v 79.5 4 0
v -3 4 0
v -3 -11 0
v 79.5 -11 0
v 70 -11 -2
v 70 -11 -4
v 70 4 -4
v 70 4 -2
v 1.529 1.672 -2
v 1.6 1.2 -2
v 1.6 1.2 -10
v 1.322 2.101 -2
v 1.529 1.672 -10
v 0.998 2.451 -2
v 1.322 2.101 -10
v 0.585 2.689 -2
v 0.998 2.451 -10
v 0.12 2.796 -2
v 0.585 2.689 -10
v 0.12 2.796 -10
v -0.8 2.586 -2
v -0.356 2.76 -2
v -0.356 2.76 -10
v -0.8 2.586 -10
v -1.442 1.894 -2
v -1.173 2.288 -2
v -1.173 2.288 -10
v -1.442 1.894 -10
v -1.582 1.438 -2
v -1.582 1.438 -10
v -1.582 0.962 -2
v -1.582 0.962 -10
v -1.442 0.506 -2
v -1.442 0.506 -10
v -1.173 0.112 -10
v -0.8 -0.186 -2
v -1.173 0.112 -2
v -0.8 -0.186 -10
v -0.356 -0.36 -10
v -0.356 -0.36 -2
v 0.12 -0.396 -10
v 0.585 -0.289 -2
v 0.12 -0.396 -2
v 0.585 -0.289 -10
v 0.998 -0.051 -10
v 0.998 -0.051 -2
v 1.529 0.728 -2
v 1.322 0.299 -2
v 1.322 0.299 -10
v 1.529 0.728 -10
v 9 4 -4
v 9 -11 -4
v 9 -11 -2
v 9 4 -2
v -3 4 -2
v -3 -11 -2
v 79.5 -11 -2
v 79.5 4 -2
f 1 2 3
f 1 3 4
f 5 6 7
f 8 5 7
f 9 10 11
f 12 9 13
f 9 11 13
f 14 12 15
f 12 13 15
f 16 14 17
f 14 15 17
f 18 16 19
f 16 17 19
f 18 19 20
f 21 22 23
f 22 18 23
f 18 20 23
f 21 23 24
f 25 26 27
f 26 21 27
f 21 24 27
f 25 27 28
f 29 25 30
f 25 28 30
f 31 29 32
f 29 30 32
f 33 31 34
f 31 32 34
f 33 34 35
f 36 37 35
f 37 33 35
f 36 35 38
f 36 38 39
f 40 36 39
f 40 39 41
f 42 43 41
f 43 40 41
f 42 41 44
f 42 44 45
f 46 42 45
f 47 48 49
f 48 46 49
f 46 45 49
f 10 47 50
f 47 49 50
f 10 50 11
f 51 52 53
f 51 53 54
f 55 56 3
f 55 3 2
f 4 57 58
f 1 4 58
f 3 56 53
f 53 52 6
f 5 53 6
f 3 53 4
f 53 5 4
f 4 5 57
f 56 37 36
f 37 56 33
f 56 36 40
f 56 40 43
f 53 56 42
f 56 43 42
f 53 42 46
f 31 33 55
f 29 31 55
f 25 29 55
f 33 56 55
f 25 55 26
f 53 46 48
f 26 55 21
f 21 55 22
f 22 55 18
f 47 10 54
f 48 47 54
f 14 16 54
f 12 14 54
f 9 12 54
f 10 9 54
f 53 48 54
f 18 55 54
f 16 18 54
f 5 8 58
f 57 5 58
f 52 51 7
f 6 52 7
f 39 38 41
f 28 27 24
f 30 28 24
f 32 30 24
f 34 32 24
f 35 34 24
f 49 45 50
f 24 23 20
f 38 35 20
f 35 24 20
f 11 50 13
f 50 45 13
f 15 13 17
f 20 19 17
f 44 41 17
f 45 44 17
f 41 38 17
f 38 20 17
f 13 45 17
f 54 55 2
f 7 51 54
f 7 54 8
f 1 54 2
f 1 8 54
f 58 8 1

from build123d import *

# Parameters (mm, degrees)
CYLINDER_R     = 1.6
CYLINDER_DEPTH = 10
BOX001_W       = 61
BOX001_H       = 15
BOX001_DEPTH   = 2
BOX_W          = 82.5
BOX_H          = 15
BOX_DEPTH      = 2


with BuildPart() as taladro1:
    # Cylinder → Cylinder (new body)
    with BuildSketch(Plane(origin=(0, 1.2, -10), x_dir=(1, 0, 0), z_dir=(0, 0, 1))):
        Circle(CYLINDER_R)
    extrude(amount=CYLINDER_DEPTH)


with BuildPart() as perfora_2mm_centro:
    # Box001 → Box001 (new body)
    with BuildSketch(Plane(origin=(12, 0, -2), x_dir=(1, 0, 0), z_dir=(0, 0, 1))):
        with Locations((30.5, 7.5)):
            Rectangle(BOX001_W, BOX001_H)
    extrude(amount=BOX001_DEPTH)


with BuildPart() as fusion001:
    # Box → Box (new body)
    with BuildSketch(Plane.XY):
        with Locations((41.25, 7.5)):
            Rectangle(BOX_W, BOX_H)
    extrude(amount=BOX_DEPTH)

    # Fusion: union perfora_2mm_centro
    add(perfora_2mm_centro.part)


with BuildPart() as fusion001_1:
    # Fusion placement: moved
    add(fusion001.part.moved(Location((-3, -11, -2))))

    # Fusion001: union taladro1
    add(taladro1.part)


with BuildPart() as fusion005:
    # Fusion005 base: copy of taladro1
    add(taladro1.part)

    # Fusion005: union Fusion001
    add(fusion001_1.part)


solid = fusion005.part
